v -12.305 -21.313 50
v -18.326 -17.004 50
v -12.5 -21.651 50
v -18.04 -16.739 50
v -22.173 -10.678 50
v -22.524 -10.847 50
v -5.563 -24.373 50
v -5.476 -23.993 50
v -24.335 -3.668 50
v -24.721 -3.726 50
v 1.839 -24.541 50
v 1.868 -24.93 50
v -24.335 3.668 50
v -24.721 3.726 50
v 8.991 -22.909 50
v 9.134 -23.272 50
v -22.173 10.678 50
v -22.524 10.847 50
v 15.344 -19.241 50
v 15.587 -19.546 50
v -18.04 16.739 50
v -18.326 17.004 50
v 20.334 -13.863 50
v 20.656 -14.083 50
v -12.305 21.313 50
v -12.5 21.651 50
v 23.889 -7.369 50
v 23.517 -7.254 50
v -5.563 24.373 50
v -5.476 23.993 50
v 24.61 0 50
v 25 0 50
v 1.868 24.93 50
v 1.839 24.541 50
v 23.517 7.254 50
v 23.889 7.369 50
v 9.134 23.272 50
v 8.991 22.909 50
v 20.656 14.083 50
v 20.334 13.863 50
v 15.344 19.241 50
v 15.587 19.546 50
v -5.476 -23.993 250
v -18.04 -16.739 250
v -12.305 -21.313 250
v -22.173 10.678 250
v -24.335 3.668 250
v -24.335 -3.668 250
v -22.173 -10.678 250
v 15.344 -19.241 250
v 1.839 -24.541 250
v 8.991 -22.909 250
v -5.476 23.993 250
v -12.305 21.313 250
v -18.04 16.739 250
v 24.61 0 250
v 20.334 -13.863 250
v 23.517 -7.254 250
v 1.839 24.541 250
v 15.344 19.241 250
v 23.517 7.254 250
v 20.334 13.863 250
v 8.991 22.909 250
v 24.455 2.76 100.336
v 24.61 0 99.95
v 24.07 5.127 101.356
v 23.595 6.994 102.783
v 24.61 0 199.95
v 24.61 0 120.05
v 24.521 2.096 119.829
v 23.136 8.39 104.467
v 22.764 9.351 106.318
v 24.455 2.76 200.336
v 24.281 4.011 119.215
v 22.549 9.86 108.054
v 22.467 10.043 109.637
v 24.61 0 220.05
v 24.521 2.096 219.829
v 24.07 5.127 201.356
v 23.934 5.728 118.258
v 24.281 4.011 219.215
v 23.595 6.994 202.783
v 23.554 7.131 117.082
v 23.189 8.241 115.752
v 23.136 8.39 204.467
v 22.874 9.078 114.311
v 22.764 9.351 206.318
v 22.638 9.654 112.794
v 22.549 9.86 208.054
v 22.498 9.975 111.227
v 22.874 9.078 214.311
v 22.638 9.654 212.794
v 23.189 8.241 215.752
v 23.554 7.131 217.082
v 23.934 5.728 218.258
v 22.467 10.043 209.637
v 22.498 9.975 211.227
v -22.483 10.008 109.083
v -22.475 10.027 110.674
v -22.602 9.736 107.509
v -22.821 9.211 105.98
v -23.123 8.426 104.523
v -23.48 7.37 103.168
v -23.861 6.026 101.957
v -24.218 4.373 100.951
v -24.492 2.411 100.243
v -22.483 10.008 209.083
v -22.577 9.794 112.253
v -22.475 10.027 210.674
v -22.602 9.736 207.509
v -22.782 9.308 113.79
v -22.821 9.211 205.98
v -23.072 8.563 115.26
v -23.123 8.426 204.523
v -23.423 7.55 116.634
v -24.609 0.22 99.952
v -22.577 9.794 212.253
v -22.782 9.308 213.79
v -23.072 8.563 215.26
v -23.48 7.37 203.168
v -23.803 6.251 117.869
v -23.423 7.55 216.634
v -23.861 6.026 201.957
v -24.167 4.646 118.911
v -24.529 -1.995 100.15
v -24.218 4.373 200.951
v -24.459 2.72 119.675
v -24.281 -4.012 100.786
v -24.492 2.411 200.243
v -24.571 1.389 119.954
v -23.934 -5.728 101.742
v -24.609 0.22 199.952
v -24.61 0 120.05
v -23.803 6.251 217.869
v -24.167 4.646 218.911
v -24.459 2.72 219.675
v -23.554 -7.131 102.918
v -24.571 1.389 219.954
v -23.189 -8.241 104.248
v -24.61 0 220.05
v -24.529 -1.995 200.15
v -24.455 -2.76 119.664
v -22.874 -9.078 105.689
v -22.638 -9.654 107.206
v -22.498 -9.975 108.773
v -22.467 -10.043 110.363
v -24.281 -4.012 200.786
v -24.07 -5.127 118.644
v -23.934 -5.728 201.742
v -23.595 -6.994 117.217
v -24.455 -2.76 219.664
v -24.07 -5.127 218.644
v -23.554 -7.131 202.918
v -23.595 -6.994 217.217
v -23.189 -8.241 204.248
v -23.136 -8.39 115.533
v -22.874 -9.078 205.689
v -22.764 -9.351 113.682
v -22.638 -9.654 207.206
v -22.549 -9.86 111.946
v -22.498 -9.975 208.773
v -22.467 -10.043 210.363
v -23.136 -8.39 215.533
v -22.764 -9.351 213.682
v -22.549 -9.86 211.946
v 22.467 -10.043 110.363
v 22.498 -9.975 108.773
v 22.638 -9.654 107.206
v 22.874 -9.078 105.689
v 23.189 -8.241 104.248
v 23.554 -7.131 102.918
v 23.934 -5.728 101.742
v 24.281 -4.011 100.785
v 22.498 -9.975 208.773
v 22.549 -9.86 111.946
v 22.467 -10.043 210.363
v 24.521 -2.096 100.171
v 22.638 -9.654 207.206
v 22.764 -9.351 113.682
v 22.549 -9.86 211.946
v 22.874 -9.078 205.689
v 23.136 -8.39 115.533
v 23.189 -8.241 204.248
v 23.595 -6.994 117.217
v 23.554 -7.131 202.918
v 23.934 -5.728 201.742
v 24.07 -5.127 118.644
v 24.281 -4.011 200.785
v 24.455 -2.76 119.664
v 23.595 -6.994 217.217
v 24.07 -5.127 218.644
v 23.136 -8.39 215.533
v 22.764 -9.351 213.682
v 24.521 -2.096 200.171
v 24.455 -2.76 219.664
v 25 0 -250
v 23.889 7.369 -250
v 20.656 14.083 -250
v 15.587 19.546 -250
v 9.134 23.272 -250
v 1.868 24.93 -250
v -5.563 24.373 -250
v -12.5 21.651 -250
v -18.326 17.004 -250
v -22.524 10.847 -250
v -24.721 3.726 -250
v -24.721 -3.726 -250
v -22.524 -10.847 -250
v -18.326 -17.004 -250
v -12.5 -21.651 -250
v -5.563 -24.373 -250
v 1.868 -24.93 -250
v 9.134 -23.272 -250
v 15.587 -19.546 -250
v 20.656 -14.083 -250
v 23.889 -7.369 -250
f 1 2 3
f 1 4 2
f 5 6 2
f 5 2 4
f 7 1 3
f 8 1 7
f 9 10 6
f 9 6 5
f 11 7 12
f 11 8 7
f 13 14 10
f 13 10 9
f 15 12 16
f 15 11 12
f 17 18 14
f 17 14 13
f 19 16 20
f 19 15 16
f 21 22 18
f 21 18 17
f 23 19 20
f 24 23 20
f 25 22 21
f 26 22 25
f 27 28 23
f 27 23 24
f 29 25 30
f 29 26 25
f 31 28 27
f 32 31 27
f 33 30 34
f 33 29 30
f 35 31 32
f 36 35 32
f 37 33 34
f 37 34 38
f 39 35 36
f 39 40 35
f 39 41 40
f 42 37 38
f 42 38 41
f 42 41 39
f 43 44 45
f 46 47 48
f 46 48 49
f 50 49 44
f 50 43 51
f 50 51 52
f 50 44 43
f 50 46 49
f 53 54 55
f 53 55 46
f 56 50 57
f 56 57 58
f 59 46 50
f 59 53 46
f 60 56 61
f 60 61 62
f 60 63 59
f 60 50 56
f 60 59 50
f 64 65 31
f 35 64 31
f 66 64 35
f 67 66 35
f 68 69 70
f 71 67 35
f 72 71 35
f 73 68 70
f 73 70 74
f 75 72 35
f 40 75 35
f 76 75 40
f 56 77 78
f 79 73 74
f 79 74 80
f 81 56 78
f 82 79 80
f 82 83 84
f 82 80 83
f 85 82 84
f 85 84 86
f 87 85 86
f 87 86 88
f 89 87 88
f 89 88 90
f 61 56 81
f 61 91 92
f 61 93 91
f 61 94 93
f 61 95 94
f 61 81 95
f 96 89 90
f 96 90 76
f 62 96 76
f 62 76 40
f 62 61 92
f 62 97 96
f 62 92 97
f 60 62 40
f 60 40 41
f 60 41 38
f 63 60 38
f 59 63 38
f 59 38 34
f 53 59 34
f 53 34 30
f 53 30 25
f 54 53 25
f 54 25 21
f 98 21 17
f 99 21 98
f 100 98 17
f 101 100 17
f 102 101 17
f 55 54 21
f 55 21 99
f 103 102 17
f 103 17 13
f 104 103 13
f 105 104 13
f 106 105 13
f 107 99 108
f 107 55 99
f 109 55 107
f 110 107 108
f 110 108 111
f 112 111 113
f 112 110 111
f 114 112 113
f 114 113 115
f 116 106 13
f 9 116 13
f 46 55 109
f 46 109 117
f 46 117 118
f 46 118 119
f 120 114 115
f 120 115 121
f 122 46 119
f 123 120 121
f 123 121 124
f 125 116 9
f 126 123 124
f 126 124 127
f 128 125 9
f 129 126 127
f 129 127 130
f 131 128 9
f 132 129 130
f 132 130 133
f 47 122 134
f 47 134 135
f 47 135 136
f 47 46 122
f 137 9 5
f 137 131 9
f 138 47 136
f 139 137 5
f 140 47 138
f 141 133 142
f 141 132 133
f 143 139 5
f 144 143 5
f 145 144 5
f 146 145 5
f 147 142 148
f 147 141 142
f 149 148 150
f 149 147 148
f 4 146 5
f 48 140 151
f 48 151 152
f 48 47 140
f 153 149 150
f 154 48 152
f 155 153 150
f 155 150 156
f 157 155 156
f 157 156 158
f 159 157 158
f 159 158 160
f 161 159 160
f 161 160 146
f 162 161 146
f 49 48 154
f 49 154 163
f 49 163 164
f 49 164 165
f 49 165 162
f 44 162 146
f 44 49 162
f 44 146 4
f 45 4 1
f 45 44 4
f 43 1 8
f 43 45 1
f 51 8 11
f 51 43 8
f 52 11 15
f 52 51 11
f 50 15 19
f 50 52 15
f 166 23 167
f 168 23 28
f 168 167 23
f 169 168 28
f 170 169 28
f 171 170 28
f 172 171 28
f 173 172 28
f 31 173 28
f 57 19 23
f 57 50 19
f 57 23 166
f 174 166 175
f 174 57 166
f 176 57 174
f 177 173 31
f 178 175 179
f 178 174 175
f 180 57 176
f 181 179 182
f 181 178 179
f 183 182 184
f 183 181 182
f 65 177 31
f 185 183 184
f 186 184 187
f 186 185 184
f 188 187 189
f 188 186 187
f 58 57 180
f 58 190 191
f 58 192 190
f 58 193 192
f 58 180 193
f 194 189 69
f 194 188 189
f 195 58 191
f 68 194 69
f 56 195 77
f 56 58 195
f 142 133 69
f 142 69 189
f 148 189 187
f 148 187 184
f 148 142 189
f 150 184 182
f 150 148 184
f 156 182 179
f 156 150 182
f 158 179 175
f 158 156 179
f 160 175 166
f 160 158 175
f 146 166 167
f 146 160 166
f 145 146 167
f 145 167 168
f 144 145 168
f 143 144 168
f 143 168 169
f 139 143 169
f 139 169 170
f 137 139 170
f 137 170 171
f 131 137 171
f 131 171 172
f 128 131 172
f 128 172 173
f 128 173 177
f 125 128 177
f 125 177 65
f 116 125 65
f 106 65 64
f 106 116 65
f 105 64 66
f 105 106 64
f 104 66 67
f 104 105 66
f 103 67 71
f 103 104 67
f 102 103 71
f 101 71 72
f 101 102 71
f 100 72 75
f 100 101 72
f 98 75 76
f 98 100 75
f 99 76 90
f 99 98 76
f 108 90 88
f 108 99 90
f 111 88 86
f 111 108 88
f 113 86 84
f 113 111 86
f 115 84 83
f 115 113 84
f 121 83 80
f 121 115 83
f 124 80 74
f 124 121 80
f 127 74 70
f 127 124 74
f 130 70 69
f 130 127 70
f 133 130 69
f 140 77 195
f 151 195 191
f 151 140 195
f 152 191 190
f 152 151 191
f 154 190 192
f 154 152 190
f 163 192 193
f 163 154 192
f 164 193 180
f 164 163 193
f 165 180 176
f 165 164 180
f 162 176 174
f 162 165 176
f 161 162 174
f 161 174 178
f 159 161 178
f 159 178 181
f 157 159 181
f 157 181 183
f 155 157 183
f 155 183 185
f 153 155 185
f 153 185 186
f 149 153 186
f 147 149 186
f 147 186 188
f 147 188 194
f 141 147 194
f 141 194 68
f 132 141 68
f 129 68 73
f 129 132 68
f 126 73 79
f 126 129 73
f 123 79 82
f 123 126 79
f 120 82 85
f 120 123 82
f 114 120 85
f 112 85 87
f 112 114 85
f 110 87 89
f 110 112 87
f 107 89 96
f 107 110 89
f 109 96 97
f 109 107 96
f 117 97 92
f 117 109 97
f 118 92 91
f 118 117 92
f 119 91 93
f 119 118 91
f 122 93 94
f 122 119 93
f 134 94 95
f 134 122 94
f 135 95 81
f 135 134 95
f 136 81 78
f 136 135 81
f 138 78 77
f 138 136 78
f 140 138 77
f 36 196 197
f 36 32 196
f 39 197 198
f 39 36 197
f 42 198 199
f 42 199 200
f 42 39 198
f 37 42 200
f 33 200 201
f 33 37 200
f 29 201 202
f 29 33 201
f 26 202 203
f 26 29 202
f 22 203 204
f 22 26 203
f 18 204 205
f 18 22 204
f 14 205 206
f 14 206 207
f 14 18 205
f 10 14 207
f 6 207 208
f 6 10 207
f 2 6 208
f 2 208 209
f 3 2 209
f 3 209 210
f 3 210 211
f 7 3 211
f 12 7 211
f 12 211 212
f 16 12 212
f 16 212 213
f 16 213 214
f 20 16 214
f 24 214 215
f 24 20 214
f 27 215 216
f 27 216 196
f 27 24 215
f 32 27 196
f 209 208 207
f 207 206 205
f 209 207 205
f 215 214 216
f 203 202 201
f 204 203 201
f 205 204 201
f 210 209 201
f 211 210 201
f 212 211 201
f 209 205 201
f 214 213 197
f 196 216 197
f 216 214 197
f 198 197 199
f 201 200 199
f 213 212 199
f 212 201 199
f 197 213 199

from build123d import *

# Parameters (mm, degrees)
SKETCH1_R               = 25
BOSS_EXTRUDE1_DEPTH     = 250
CUT_EXTRUDE1_DEPTH      = 253.487623459
CUT_EXTRUDE1_DEPTH_BACK = 253.487623459
SKETCH2_R               = 10.05
SKETCH3_OUTSIDE_W       = 152.996
SKETCH3_OUTSIDE_H       = 152.996
SKETCH3_OUTSIDE_R       = 24.61
CUT_EXTRUDE2_DEPTH      = 200


with BuildPart() as part:
    # Sketch1 → Boss-Extrude1 (new, symmetric)
    with BuildSketch(Plane.XY):
        Circle(SKETCH1_R)
    extrude(amount=BOSS_EXTRUDE1_DEPTH, both=True)

    # Sketch2 → Cut-Extrude1 (cut, two sides: drawn at the far end of the back side and taken through both)
    with BuildSketch(Plane(origin=(0, 0, 0), x_dir=(0, 0, -1), z_dir=(1, 0, 0)).offset(-CUT_EXTRUDE1_DEPTH_BACK)):
        with Locations(Location((-210, 0, 0), (0, 0, 180))):
            Circle(SKETCH2_R)
        with Locations(Location((-110, 0, 0), (0, 0, 180))):
            Circle(SKETCH2_R)
    extrude(amount=CUT_EXTRUDE1_DEPTH + CUT_EXTRUDE1_DEPTH_BACK, mode=Mode.SUBTRACT)

    # Sketch3 outside → Cut-Extrude2 (cut)
    with BuildSketch(Plane.XY.offset(250)):
        Rectangle(SKETCH3_OUTSIDE_W, SKETCH3_OUTSIDE_H)
        Circle(SKETCH3_OUTSIDE_R, mode=Mode.SUBTRACT)
    extrude(amount=-CUT_EXTRUDE2_DEPTH, mode=Mode.SUBTRACT)


solid = part.part
